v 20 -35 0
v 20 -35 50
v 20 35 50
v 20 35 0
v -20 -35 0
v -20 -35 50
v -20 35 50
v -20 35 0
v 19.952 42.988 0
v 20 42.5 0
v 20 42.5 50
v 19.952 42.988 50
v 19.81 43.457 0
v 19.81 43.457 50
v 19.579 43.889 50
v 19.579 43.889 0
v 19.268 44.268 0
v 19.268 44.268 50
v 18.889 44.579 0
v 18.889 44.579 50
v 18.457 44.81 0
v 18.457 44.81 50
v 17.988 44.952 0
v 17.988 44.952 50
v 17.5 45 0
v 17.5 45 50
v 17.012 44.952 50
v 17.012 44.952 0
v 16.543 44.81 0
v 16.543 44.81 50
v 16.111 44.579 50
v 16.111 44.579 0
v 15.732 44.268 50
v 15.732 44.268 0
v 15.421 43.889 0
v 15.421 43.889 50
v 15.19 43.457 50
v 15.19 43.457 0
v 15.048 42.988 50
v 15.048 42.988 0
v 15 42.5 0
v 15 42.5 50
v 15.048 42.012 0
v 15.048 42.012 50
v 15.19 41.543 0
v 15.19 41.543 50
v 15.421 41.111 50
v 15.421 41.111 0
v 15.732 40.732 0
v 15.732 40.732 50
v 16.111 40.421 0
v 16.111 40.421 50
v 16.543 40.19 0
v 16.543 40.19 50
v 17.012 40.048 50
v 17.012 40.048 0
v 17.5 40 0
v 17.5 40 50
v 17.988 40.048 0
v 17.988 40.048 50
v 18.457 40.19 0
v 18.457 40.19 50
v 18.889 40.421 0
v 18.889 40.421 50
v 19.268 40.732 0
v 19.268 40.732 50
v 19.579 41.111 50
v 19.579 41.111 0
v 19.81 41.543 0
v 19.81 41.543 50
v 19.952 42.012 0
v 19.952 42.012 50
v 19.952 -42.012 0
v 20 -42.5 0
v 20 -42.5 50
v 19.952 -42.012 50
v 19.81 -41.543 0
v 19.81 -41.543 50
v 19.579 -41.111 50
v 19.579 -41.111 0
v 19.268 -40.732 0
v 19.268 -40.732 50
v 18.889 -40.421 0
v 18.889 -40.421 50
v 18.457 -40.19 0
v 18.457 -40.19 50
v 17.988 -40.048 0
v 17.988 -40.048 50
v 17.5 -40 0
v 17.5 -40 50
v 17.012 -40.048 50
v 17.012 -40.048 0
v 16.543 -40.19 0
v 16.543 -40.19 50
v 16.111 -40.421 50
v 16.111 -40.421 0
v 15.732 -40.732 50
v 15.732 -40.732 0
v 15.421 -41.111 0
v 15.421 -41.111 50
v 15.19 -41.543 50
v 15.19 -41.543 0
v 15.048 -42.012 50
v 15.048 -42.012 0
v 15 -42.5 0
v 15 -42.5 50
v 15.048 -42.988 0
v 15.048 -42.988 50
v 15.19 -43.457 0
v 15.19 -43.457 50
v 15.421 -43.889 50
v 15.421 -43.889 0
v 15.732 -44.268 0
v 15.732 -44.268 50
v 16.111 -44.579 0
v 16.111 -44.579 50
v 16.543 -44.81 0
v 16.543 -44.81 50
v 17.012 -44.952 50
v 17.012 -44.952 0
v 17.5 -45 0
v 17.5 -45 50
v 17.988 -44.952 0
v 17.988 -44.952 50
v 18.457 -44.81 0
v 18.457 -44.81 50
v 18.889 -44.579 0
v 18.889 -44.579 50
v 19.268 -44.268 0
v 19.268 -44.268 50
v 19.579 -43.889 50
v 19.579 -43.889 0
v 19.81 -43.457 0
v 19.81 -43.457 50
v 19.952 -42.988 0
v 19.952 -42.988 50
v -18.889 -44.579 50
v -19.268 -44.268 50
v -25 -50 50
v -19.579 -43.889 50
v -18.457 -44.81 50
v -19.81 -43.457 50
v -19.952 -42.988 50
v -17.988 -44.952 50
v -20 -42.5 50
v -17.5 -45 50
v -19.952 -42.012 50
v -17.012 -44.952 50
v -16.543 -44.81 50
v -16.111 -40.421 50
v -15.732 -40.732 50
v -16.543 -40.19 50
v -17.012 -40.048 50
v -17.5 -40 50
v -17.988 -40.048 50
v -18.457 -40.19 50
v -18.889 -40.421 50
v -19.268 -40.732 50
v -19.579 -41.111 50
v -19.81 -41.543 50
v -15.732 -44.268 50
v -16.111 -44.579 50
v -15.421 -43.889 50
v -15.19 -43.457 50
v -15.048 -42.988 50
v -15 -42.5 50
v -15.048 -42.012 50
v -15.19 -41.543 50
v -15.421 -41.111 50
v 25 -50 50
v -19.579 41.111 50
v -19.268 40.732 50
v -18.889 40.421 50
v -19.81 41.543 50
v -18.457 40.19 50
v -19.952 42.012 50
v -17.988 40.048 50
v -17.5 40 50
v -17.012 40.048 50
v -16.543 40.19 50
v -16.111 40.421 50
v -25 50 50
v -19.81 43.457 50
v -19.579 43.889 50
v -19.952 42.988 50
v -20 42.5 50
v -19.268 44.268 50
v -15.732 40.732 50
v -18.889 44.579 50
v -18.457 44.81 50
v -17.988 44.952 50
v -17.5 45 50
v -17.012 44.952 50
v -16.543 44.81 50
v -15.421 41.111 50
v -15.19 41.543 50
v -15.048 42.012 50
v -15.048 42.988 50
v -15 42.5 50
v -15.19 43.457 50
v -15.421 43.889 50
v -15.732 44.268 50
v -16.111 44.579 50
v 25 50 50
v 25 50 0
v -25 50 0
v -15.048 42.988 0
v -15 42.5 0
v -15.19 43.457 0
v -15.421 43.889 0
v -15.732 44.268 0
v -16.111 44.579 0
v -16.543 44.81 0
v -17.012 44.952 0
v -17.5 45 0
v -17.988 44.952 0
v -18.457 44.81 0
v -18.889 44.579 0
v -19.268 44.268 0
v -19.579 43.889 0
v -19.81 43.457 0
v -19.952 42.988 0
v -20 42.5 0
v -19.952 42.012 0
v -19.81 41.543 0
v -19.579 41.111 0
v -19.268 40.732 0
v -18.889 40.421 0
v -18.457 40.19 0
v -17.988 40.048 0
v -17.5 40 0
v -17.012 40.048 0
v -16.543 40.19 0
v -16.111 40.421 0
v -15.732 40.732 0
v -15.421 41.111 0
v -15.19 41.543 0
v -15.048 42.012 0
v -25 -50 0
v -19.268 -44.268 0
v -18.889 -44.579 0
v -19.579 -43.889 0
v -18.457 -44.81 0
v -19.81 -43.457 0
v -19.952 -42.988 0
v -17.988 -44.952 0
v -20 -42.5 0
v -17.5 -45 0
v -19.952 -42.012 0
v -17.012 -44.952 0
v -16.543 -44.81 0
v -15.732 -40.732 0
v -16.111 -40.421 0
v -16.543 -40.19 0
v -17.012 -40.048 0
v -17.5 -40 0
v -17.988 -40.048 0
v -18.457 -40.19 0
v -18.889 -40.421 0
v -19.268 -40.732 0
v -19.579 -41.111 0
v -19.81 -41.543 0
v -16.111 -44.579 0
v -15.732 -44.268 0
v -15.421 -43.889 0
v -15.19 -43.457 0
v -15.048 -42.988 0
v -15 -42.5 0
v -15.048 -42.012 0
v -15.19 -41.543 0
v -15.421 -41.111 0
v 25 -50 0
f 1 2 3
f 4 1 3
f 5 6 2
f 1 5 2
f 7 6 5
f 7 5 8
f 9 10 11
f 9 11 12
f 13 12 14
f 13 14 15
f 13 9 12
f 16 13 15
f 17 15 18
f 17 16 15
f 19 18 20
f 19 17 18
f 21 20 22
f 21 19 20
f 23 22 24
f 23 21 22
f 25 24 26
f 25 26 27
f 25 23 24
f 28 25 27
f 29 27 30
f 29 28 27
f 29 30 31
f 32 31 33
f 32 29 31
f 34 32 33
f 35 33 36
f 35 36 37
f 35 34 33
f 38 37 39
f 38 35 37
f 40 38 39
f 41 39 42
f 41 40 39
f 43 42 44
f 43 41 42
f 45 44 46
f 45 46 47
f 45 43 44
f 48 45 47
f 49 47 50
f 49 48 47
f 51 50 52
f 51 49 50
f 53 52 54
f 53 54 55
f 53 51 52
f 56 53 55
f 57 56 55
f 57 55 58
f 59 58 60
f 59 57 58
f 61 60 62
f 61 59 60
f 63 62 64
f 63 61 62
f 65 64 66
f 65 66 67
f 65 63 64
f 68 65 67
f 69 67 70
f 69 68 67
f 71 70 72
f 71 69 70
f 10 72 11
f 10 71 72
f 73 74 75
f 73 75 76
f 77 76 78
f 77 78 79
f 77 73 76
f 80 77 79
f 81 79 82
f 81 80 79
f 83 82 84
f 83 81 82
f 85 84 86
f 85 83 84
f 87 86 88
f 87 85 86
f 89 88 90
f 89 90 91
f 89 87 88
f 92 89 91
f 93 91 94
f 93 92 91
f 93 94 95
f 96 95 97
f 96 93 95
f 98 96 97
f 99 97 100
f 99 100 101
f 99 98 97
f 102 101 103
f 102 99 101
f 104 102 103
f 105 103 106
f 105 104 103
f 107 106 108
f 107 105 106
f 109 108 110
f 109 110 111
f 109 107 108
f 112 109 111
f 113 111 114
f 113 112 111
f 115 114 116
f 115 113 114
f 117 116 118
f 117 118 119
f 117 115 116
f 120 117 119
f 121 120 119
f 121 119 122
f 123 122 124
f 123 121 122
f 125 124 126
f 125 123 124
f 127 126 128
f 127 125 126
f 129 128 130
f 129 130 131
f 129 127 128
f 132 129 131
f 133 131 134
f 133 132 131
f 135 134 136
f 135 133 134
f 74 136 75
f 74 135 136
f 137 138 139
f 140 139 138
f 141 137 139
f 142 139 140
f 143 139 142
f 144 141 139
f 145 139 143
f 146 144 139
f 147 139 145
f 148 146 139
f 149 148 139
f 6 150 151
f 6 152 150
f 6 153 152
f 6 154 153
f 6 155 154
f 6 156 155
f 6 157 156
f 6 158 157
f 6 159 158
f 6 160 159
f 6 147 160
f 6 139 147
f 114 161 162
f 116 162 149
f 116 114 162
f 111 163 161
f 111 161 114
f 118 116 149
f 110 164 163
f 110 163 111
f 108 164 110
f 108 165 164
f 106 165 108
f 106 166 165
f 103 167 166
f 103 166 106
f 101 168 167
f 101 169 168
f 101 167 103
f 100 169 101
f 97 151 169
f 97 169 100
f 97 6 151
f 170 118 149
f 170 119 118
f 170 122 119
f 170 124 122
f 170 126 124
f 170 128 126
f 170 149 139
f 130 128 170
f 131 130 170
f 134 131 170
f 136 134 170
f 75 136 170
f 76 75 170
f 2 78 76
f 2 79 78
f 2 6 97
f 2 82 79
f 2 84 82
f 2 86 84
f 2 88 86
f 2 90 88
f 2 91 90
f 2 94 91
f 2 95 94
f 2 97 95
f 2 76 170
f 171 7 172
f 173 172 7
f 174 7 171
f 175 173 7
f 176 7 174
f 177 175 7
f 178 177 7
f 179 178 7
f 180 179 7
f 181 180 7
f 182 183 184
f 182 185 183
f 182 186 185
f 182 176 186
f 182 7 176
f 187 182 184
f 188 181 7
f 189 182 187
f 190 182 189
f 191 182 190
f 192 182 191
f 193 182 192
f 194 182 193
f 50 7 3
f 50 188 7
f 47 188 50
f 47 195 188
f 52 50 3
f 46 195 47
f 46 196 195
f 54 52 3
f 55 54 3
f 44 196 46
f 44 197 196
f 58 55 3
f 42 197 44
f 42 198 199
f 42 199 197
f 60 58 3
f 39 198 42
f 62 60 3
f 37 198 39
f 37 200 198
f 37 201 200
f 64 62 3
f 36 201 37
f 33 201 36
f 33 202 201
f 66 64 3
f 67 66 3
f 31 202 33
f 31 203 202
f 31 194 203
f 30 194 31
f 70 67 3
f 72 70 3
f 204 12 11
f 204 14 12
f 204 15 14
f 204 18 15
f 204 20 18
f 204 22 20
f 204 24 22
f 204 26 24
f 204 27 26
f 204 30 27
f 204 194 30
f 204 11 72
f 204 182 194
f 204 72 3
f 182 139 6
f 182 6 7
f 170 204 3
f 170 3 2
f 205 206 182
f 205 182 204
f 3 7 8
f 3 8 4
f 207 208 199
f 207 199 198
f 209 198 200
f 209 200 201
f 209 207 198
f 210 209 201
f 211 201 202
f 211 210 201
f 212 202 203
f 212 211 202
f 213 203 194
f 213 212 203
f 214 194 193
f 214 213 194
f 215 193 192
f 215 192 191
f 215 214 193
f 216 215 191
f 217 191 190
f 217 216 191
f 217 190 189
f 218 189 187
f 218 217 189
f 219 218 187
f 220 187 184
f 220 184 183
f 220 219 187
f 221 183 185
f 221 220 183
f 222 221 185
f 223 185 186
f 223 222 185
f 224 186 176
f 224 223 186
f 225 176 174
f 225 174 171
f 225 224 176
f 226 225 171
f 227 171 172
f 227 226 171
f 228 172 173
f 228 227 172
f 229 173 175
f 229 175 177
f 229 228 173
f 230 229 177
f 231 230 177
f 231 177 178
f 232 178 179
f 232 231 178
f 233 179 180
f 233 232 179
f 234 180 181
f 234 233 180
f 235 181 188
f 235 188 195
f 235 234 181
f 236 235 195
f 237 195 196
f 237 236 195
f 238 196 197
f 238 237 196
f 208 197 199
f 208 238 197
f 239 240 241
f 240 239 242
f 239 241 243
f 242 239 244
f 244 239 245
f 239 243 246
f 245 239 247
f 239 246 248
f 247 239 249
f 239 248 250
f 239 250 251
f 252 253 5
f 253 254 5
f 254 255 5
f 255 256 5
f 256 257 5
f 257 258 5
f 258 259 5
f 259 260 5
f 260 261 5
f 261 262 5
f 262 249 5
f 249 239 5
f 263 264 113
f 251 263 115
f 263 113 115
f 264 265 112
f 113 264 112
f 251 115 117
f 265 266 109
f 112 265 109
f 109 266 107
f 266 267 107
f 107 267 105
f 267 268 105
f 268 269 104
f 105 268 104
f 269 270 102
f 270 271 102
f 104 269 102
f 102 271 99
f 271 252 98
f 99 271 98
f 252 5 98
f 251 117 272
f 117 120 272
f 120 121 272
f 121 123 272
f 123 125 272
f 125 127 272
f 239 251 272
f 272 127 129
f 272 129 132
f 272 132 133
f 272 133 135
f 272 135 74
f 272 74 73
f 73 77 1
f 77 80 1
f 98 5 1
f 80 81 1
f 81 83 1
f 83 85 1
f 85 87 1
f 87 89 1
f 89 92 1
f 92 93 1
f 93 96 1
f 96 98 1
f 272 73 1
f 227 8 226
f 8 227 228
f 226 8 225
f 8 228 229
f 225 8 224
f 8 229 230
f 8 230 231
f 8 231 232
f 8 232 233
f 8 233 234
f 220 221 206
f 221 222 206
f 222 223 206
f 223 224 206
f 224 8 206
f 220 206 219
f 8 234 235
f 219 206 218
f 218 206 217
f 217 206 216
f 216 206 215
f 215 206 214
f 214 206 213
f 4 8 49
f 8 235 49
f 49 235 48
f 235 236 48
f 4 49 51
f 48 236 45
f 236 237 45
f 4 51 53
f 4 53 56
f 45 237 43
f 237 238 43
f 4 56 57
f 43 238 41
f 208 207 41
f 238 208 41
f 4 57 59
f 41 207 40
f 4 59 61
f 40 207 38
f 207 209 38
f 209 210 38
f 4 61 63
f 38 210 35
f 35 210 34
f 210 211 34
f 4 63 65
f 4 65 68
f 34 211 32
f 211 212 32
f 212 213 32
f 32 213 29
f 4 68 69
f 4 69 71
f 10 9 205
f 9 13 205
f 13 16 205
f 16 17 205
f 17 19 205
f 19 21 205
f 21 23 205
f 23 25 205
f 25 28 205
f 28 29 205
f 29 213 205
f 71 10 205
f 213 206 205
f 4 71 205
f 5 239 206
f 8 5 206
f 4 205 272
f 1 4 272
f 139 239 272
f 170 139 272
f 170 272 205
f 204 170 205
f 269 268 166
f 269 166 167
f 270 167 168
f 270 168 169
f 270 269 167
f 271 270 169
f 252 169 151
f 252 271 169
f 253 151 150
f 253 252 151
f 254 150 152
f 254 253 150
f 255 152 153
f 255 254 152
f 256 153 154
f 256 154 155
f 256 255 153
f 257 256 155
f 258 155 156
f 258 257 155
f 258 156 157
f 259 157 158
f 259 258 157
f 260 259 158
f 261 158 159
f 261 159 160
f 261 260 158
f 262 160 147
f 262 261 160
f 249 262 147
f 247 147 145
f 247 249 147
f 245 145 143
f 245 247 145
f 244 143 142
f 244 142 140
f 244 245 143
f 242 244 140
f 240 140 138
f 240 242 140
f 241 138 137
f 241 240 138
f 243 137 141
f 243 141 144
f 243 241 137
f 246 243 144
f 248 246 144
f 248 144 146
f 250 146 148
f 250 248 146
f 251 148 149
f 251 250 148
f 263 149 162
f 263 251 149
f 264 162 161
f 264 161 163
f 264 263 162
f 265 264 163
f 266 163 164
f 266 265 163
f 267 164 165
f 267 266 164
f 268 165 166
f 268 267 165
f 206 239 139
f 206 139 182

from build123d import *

# Parameters (mm, degrees)
SKETCH1_W           = 50
SKETCH1_H           = 100
SKETCH1_R           = 2.5
BOSS_EXTRUDE1_DEPTH = 50
SKETCH2_W           = 40
SKETCH2_H           = 70
CUT_EXTRUDE1_DEPTH  = 93


with BuildPart() as part:
    # Sketch1 → Boss-Extrude1 (new body)
    with BuildSketch(Plane.XY):
        Rectangle(SKETCH1_W, SKETCH1_H)
        with Locations((-17.5, 42.5)):
            Circle(SKETCH1_R, mode=Mode.SUBTRACT)
        with Locations((17.5, 42.5)):
            Circle(SKETCH1_R, mode=Mode.SUBTRACT)
        with Locations((-17.5, -42.5)):
            Circle(SKETCH1_R, mode=Mode.SUBTRACT)
        with Locations((17.5, -42.5)):
            Circle(SKETCH1_R, mode=Mode.SUBTRACT)
    extrude(amount=BOSS_EXTRUDE1_DEPTH)

    # Sketch2 → Cut-Extrude1 (cut)
    with BuildSketch(Plane.XY.offset(50)):
        Rectangle(SKETCH2_W, SKETCH2_H)
    extrude(amount=-CUT_EXTRUDE1_DEPTH, mode=Mode.SUBTRACT)


solid = part.part
